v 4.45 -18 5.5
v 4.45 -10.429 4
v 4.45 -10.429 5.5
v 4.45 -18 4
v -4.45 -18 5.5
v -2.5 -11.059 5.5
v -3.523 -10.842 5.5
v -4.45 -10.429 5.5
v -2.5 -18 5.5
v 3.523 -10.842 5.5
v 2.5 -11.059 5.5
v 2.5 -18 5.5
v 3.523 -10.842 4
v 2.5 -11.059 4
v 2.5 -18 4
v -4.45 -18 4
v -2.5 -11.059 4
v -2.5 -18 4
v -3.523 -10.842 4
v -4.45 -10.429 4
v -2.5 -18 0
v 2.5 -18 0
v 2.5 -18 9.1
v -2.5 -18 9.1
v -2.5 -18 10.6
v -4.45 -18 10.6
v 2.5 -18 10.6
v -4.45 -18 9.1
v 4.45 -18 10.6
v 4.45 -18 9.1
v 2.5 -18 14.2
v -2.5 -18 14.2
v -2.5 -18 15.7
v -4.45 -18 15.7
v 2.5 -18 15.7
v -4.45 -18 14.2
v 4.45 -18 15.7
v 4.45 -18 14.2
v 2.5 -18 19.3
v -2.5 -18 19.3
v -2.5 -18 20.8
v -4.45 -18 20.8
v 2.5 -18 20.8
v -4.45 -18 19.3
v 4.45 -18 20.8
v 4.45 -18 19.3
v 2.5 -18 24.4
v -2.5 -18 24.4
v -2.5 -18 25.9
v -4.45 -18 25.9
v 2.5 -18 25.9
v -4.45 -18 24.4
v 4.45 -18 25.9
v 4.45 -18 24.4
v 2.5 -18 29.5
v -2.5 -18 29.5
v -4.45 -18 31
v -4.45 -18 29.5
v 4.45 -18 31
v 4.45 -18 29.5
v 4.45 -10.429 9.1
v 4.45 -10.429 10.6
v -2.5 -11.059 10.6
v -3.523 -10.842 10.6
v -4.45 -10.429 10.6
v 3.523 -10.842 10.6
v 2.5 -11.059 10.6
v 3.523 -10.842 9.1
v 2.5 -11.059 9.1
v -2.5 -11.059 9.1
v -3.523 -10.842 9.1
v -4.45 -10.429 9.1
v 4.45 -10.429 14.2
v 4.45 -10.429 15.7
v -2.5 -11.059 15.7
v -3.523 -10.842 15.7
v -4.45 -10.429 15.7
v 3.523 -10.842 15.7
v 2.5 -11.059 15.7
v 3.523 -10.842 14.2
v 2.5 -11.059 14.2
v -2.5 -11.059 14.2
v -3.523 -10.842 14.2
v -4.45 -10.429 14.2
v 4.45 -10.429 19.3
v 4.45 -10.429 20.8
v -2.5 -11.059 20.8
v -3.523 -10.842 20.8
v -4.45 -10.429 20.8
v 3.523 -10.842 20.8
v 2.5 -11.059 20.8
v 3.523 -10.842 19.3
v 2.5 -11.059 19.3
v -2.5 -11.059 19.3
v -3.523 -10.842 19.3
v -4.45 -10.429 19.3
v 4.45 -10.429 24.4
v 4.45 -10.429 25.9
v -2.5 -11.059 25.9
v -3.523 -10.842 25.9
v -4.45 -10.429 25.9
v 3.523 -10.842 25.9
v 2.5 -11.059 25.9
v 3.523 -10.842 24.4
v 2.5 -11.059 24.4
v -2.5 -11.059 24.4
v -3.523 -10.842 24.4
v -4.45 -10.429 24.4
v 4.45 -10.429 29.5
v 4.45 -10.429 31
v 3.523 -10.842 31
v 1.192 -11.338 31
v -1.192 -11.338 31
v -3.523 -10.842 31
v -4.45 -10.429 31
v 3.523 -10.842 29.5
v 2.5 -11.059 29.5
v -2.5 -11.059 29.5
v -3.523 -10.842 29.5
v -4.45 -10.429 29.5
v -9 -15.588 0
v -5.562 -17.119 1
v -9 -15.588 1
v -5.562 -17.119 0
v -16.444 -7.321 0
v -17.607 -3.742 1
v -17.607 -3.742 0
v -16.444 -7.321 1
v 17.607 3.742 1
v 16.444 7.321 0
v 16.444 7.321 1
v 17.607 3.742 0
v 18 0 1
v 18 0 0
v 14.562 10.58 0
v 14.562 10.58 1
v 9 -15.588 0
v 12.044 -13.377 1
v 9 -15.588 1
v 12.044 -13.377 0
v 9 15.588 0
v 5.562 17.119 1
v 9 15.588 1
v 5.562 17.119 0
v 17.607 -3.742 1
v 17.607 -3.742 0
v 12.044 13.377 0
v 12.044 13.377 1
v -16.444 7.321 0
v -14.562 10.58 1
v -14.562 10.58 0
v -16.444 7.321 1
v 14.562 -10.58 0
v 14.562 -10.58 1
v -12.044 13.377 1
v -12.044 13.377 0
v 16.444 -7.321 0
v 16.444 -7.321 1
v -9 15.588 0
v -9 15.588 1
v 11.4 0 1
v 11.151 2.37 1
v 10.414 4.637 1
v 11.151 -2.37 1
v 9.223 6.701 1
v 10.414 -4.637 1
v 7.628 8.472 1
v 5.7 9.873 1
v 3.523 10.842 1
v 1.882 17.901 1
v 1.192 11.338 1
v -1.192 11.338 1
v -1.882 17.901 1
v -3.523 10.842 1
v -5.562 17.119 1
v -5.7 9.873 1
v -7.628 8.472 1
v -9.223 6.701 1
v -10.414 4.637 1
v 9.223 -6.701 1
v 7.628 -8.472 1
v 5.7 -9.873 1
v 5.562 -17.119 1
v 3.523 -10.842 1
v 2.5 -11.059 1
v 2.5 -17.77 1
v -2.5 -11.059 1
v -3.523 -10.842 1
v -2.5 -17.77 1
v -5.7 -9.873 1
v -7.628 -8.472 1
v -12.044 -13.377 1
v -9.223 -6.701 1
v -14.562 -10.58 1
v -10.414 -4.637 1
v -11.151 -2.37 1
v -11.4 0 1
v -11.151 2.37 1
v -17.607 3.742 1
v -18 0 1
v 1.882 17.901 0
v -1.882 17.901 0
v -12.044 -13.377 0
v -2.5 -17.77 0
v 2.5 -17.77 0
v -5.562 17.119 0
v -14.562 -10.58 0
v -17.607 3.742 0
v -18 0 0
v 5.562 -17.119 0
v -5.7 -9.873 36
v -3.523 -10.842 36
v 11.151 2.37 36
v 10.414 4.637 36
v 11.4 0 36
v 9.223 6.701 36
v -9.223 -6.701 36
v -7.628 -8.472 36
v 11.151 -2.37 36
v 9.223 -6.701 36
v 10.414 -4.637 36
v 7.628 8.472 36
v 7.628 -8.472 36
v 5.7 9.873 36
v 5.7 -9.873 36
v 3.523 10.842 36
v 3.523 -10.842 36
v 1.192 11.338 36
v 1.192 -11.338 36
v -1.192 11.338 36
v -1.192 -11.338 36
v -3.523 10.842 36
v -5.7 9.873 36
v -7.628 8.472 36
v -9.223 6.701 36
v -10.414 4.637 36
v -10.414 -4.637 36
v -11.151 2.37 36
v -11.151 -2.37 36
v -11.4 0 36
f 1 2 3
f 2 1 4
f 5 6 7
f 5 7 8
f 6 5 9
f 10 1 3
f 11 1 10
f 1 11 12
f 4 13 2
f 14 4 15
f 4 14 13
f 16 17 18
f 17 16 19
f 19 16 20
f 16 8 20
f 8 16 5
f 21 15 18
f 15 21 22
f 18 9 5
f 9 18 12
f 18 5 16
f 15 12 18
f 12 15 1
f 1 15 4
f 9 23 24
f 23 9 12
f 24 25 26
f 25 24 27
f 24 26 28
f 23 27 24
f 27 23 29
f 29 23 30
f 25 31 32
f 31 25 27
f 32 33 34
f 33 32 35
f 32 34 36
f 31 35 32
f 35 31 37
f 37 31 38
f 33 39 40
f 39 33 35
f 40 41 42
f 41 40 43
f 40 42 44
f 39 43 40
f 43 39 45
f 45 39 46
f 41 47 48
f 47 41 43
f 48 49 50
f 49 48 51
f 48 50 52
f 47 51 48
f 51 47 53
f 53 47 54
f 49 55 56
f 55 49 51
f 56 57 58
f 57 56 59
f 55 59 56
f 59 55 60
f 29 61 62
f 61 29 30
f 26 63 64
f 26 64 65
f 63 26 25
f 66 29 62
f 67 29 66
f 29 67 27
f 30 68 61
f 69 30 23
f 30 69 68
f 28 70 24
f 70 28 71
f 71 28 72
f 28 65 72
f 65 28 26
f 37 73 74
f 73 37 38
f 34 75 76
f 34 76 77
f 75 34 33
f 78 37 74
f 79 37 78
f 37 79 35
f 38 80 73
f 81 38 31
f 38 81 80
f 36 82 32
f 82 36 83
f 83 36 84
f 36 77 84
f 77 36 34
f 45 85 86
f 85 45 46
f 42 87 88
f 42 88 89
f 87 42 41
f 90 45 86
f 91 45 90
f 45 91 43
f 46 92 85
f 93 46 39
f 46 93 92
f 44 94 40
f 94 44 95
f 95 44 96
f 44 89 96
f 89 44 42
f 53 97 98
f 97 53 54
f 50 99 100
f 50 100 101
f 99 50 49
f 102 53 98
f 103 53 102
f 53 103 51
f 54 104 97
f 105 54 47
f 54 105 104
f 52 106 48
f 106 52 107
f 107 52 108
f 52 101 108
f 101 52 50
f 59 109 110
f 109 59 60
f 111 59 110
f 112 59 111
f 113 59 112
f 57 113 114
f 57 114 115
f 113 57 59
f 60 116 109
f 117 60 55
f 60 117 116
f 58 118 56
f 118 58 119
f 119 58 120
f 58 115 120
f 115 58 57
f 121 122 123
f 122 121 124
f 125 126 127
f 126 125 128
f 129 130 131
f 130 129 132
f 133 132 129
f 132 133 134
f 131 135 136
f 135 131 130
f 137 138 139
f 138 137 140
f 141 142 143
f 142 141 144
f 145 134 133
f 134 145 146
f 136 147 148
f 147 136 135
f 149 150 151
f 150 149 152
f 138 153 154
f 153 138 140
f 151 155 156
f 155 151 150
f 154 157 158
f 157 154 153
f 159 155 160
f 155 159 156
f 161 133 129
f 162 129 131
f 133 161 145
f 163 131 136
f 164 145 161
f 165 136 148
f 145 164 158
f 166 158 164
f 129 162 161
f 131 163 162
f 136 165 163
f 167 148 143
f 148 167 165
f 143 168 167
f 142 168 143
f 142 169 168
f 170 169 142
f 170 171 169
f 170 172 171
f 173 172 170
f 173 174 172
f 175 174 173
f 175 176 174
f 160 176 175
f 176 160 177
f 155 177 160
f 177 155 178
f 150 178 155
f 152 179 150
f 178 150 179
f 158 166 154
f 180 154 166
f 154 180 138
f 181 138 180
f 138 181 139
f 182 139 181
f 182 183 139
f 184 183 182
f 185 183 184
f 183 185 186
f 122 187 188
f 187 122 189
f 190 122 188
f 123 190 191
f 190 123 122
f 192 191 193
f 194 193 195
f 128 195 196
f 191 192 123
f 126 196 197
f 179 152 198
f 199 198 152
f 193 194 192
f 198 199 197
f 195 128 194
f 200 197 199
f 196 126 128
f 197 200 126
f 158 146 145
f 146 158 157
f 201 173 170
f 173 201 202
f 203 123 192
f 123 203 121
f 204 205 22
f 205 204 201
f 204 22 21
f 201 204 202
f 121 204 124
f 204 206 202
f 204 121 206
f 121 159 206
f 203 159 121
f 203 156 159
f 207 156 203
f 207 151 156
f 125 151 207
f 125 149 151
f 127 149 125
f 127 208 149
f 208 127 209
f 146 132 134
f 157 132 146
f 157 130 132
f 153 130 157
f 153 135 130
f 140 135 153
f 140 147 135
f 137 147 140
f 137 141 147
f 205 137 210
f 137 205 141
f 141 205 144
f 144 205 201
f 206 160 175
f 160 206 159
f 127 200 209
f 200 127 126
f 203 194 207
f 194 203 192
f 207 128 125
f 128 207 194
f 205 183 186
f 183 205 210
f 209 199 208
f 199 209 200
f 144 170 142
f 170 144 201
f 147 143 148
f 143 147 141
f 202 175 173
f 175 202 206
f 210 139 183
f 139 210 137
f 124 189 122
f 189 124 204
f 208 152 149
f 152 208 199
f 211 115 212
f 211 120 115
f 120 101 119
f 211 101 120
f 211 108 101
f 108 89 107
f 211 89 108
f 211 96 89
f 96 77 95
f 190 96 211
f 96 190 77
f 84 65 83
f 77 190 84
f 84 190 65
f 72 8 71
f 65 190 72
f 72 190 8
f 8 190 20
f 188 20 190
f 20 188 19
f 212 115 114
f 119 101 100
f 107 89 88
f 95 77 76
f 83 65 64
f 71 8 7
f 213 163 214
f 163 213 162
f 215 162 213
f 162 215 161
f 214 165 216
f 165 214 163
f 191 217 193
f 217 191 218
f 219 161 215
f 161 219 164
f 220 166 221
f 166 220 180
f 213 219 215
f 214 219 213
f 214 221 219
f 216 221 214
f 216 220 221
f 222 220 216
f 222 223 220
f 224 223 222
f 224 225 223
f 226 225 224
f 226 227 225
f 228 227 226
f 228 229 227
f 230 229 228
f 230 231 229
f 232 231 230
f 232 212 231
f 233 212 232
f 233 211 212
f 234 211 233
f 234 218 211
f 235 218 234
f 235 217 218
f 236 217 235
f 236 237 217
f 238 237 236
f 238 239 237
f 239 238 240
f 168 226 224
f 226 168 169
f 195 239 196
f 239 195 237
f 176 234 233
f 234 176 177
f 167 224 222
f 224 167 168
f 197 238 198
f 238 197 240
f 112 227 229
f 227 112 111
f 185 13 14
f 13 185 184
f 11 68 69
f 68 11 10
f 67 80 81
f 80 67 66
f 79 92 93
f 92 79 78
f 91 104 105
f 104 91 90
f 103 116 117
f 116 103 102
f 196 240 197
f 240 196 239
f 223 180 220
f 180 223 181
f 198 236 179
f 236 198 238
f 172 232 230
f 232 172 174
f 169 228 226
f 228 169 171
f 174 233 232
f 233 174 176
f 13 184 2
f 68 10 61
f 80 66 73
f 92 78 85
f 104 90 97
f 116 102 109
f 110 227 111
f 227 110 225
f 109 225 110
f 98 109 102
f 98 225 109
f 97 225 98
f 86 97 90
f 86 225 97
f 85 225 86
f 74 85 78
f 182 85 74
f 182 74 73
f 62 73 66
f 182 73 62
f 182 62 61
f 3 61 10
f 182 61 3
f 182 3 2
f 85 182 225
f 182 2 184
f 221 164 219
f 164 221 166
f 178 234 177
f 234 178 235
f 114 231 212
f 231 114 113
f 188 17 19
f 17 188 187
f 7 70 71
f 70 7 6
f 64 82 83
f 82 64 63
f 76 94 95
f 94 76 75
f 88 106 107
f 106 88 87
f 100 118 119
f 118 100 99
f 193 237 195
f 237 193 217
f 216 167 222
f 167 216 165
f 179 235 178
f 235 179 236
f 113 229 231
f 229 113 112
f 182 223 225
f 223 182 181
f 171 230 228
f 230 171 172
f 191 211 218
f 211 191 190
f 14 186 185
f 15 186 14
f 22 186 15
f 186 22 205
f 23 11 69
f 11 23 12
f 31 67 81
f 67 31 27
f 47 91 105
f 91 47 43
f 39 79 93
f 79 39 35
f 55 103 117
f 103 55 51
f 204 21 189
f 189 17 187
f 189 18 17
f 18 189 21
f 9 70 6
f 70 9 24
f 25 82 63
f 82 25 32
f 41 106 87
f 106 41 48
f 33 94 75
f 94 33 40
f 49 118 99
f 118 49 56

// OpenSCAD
// Test jig for Hinge cover for the Macintosh Portable
// Copyright François Revol, 2026




cylinder(d=36, h=1);
cylinder(d=22.8, h=32+4);
translate([0,-18/2,(27+4)/2]) cube([5, 18, 27+4], center=true);
for (dz=[0:5])
    translate([0,-18/2,1.5/2+(dz/5)*(27-1.5)+4]) cube([8.9, 18, 1.5], center=true);
